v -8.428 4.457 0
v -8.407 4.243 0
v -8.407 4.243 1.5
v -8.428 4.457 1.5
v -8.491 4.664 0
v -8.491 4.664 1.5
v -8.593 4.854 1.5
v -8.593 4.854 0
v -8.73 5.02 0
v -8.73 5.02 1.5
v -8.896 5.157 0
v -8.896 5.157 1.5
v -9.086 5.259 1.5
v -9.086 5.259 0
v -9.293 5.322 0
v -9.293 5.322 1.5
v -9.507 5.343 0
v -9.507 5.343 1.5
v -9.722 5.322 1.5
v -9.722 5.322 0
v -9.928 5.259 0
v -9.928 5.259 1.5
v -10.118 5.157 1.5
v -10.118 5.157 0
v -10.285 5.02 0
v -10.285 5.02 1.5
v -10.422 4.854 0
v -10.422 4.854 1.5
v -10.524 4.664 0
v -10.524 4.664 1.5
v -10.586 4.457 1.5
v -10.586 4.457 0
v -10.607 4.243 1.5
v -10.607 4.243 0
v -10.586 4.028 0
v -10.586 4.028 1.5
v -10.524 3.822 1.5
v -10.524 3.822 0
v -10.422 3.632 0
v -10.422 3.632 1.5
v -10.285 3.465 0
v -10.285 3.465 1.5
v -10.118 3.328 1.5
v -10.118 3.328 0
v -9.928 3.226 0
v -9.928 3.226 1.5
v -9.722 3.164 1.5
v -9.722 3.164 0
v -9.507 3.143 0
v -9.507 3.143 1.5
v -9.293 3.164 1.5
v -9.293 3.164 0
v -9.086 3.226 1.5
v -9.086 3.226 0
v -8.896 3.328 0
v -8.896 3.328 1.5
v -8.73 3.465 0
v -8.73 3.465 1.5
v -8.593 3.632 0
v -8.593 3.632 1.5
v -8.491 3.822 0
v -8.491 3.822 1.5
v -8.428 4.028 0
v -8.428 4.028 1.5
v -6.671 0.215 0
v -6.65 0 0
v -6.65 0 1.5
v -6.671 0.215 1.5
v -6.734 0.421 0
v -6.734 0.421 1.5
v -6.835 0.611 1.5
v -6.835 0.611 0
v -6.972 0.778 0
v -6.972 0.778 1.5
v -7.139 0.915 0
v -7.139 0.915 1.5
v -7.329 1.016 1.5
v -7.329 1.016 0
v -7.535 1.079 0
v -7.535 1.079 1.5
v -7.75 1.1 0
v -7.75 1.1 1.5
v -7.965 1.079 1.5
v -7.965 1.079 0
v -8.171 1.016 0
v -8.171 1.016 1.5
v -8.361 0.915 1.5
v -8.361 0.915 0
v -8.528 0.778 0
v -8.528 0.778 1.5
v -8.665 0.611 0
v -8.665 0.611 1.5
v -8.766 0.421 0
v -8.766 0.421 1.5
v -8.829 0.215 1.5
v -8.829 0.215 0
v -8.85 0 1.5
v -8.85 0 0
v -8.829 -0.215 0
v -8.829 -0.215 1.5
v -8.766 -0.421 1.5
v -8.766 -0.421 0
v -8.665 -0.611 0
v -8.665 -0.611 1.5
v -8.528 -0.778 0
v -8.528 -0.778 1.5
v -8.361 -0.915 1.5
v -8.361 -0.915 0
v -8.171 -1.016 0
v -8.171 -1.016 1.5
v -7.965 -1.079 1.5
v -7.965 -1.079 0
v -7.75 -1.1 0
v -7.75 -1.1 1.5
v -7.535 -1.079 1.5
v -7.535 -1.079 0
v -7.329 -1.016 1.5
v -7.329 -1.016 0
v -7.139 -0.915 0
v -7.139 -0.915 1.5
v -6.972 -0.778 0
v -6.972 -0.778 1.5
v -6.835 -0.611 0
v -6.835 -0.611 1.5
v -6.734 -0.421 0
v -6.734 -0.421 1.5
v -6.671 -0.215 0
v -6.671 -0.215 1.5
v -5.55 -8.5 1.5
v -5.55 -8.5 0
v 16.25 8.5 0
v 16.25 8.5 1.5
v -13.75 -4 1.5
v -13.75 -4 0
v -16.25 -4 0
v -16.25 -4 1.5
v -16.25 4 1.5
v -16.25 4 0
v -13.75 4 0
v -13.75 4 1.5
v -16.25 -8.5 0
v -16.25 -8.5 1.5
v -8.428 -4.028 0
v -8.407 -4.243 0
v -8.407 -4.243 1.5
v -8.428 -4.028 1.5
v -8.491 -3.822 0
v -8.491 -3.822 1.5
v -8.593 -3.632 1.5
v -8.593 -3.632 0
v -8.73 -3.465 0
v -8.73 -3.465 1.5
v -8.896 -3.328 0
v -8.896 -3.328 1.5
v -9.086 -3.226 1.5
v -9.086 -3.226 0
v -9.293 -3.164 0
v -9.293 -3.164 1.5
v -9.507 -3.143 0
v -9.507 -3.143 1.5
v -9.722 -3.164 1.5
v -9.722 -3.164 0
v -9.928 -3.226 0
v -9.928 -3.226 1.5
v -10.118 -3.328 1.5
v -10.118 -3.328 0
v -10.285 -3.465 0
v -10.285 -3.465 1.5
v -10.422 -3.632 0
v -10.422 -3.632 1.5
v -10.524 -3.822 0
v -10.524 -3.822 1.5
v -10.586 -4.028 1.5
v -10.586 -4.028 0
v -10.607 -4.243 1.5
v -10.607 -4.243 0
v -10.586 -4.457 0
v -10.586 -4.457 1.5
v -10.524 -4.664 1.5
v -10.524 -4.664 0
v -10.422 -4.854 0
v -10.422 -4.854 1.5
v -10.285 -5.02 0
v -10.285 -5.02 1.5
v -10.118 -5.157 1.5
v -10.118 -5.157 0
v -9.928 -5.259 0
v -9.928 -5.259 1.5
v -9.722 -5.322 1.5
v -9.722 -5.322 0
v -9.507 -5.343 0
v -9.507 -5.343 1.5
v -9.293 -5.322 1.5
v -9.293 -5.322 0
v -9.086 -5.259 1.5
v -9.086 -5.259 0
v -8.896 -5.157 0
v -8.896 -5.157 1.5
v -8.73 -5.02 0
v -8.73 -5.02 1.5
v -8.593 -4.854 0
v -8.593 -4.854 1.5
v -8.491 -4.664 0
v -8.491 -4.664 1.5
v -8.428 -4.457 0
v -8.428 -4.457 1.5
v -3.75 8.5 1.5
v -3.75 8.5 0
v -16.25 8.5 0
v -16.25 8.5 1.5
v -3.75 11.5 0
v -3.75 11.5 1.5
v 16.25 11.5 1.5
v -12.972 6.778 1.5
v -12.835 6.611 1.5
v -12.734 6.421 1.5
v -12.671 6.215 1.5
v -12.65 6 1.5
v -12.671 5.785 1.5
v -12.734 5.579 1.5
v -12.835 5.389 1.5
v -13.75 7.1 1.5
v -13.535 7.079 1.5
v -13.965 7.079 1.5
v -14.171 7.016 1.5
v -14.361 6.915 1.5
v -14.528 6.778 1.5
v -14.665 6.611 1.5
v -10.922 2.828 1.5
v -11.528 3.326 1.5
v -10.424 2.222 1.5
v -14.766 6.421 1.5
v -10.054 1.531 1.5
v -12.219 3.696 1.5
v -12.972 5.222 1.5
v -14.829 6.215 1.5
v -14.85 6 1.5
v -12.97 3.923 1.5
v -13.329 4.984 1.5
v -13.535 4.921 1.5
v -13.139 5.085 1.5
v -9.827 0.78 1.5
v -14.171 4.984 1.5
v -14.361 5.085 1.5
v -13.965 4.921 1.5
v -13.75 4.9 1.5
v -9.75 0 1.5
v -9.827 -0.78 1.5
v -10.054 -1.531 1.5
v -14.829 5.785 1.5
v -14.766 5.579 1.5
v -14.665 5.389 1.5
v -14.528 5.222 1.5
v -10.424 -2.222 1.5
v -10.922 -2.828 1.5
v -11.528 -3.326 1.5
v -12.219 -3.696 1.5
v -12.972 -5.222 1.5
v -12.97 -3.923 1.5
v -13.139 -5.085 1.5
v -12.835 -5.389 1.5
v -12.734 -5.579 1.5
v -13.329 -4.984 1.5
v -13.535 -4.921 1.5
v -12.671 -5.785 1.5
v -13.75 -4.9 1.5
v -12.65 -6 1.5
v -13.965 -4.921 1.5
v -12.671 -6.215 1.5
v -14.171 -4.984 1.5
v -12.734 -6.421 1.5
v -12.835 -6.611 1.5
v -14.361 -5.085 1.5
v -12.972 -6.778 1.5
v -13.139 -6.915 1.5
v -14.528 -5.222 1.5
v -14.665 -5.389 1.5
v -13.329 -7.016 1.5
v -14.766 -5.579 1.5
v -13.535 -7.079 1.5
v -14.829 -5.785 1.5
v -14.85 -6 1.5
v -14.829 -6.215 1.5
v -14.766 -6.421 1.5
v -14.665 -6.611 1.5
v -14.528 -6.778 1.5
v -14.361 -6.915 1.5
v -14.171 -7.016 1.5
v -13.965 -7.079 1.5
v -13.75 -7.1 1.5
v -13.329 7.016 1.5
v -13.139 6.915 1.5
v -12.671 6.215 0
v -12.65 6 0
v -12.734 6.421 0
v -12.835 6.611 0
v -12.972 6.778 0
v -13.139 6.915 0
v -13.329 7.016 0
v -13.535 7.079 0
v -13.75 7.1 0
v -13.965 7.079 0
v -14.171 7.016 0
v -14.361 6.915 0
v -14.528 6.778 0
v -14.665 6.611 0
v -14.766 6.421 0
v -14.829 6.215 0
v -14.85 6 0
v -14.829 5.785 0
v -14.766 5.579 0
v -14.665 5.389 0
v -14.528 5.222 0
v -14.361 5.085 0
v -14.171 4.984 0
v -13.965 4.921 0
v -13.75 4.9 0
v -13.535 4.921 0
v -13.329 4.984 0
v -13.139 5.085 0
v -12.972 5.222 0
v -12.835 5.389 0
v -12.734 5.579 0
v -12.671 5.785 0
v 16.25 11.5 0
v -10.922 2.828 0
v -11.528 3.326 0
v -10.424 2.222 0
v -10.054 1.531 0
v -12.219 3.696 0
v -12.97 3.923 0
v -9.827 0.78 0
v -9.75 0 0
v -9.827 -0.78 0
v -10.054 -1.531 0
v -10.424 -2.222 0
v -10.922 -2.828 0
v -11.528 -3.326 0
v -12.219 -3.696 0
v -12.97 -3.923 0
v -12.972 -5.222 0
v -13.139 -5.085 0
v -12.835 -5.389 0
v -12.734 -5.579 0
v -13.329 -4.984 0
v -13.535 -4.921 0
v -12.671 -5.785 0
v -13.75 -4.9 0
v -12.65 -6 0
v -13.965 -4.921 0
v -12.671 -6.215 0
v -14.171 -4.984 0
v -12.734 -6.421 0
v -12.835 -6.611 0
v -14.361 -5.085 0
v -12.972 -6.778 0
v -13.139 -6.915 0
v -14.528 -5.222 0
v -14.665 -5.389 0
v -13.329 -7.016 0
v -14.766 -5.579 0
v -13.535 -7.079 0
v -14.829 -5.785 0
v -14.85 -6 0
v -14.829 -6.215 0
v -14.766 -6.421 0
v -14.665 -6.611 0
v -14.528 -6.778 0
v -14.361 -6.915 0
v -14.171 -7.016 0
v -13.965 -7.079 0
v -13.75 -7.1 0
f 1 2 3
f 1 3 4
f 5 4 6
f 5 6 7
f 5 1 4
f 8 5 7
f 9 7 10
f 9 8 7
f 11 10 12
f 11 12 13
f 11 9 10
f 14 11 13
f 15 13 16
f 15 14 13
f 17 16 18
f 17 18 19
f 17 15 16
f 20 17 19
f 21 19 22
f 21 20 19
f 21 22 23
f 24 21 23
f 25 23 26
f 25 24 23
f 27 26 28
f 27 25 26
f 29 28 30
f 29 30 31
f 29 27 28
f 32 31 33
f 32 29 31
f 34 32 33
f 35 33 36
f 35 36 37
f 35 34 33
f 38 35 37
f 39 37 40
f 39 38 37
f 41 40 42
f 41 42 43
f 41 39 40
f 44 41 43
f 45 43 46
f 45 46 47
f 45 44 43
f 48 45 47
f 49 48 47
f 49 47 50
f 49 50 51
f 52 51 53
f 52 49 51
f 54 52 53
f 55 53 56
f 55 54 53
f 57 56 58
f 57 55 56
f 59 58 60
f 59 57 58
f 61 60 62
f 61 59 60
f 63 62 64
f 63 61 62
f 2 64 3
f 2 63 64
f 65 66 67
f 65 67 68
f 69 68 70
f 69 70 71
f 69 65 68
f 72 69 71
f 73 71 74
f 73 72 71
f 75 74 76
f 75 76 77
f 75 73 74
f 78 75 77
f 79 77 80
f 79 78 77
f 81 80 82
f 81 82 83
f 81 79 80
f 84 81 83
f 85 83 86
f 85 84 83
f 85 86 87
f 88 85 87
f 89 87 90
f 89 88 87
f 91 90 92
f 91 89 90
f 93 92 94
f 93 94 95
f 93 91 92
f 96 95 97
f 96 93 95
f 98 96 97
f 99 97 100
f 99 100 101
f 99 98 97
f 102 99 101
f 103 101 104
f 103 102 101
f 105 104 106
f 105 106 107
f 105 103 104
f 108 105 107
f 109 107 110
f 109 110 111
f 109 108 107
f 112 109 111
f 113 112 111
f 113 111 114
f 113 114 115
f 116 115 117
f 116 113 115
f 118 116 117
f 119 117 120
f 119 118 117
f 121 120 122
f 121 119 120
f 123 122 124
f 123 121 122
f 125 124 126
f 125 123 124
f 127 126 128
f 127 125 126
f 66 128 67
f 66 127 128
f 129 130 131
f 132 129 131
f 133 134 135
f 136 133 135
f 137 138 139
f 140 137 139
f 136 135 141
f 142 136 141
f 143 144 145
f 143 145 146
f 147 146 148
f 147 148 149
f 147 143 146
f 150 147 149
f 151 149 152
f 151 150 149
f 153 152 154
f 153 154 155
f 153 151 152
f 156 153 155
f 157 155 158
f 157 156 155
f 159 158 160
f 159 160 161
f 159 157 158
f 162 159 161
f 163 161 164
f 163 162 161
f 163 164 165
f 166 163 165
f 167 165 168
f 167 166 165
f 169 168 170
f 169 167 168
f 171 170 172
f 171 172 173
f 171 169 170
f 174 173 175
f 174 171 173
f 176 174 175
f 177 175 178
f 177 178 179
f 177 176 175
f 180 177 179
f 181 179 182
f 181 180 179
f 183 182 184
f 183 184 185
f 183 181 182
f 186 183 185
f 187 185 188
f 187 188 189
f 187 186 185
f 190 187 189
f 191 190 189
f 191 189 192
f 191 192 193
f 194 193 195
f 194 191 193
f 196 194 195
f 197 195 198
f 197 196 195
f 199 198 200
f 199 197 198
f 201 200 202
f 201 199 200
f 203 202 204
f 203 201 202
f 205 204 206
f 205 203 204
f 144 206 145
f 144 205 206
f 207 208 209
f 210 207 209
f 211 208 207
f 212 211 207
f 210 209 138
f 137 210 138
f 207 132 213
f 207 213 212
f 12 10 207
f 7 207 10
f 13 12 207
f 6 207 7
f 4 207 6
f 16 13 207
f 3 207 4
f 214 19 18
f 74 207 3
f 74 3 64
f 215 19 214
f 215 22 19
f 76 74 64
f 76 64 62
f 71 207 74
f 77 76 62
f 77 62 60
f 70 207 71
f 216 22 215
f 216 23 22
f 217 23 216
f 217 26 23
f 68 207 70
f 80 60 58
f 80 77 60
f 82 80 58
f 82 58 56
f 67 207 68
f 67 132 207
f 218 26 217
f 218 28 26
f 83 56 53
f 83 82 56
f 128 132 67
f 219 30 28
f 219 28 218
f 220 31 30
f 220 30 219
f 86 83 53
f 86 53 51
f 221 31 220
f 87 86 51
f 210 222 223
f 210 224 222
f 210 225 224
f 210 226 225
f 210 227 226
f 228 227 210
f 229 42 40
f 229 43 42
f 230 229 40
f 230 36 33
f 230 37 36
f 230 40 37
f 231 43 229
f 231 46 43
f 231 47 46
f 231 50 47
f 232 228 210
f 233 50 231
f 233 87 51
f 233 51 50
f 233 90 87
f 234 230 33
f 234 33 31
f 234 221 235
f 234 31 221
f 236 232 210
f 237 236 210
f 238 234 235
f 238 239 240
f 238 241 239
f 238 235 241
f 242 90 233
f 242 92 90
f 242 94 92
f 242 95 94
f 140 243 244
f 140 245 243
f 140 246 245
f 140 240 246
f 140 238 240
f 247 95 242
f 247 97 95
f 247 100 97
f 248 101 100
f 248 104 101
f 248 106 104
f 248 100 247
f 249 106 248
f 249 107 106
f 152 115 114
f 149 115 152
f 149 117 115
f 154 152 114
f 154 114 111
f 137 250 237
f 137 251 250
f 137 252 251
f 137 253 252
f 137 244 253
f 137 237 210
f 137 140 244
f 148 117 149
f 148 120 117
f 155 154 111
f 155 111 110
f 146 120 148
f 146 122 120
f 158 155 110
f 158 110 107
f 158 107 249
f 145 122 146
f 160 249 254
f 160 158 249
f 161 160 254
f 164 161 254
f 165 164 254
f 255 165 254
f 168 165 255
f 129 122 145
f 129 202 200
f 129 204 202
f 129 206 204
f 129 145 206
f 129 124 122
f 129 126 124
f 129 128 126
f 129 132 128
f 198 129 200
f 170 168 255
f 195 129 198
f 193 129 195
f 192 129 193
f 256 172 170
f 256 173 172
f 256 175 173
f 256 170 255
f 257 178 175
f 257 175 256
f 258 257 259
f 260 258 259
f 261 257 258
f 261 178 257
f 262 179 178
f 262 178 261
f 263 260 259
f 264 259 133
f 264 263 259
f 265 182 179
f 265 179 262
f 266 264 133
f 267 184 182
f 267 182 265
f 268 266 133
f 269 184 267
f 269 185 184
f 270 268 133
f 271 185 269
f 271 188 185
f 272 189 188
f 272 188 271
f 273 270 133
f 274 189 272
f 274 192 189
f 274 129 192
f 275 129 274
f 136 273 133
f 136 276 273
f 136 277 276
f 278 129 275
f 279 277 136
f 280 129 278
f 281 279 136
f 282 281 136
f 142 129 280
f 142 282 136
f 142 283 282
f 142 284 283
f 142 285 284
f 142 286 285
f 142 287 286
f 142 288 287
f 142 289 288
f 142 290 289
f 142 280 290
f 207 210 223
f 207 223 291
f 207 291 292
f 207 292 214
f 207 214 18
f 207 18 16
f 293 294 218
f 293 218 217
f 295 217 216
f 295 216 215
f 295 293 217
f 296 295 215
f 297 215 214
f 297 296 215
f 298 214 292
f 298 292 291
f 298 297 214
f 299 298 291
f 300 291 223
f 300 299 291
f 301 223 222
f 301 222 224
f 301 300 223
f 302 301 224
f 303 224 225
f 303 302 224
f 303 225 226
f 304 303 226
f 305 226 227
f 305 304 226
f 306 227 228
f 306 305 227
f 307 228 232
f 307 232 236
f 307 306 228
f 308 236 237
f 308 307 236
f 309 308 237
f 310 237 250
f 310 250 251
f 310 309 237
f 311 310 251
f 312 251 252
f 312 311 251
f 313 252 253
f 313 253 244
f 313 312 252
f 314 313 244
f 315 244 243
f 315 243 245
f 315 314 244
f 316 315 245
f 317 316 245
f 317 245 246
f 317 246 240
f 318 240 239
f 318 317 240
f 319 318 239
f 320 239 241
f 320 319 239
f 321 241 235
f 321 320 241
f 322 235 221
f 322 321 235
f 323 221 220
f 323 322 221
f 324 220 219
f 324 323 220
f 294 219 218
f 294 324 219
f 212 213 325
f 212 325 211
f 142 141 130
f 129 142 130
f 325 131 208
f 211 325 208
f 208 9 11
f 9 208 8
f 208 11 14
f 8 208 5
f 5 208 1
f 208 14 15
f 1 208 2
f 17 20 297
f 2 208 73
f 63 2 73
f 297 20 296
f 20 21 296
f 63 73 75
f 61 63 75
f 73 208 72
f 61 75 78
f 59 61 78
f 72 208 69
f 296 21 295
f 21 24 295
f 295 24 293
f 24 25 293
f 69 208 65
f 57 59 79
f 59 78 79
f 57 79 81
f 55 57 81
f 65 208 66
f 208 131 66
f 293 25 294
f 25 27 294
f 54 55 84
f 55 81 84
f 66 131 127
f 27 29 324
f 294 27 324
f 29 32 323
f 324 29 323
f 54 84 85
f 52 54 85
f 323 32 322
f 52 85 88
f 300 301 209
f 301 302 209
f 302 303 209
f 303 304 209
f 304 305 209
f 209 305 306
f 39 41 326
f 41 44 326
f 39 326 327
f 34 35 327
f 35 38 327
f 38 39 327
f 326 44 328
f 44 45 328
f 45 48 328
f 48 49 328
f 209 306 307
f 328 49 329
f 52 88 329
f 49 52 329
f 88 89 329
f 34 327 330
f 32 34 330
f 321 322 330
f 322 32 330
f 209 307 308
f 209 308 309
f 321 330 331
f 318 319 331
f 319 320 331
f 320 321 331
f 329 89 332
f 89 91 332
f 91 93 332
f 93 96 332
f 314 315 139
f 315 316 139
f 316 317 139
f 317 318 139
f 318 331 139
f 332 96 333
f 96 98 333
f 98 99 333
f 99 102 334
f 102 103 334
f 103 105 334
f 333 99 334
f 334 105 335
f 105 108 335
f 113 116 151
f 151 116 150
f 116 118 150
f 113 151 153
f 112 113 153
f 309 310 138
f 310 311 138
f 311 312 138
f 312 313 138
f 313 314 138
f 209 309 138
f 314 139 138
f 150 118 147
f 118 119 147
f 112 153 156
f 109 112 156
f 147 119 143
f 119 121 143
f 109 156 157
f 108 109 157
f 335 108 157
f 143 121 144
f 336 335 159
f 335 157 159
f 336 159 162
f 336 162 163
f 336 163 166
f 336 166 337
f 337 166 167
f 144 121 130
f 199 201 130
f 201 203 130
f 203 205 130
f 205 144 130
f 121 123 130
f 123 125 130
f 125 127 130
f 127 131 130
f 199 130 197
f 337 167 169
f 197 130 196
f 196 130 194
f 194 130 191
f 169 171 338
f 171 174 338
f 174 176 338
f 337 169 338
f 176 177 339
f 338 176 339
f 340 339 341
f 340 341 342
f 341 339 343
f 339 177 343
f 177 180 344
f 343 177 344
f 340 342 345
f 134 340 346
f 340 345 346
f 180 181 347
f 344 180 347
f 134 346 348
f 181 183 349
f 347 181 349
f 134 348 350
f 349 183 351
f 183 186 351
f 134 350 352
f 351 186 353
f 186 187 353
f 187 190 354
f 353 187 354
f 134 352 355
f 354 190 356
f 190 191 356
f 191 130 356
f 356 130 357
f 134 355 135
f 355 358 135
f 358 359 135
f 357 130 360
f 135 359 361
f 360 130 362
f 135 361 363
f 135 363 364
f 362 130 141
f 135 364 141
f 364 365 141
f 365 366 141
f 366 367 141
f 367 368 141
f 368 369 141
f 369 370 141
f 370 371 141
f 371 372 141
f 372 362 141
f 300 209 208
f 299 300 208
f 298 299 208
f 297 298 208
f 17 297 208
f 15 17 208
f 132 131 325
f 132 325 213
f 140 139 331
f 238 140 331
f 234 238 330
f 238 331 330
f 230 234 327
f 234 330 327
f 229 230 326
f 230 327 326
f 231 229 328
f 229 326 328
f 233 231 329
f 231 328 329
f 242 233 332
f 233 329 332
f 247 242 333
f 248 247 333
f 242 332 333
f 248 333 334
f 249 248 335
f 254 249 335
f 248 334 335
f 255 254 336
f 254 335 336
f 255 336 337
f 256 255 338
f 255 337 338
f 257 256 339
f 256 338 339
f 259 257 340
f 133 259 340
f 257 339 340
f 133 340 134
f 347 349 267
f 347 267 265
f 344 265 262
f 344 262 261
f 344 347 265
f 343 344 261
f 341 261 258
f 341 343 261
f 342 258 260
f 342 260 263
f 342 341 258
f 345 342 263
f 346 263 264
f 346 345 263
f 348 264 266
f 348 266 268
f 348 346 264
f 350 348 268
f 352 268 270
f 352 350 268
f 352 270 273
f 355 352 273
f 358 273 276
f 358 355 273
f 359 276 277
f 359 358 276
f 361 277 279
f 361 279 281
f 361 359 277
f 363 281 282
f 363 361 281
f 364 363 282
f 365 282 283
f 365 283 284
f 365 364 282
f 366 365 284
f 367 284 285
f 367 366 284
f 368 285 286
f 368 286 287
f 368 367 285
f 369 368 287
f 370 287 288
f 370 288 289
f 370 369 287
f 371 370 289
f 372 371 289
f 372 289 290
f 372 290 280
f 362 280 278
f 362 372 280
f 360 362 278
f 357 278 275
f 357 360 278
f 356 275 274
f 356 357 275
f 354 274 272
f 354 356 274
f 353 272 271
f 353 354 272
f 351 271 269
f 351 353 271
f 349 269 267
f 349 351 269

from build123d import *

# Parameters (mm, degrees)
F0_R     = 1.1
F1_DEPTH = 1.5
F2_W     = 20
F2_H     = 1.5
F3_DEPTH = 3


with BuildPart() as f1:
    # F0 (on Top) → F1 (new body)
    with BuildSketch(Plane.XY):
        with BuildLine():
            Line((-5.55, -8.5), (16.25, 8.5))
            Line((16.25, 8.5), (-16.25, 8.5))
            Line((-16.25, 8.5), (-16.25, 4))
            Line((-16.25, 4), (-13.75, 4))
            ThreePointArc((-13.75, 4), (-9.75, 0), (-13.75, -4))
            Line((-13.75, -4), (-16.25, -4))
            Line((-16.25, -4), (-16.25, -8.5))
            Line((-16.25, -8.5), (-5.55, -8.5))
        make_face()
        with Locations((-13.75, -6)):
            Circle(F0_R, mode=Mode.SUBTRACT)
        with Locations((-9.507359, -4.242641)):
            Circle(F0_R, mode=Mode.SUBTRACT)
        with Locations((-9.507359, 4.242641)):
            Circle(F0_R, mode=Mode.SUBTRACT)
        with Locations((-7.75, 0)):
            Circle(F0_R, mode=Mode.SUBTRACT)
        with Locations((-13.75, 6)):
            Circle(F0_R, mode=Mode.SUBTRACT)
    extrude(amount=F1_DEPTH)

    # F2 (on face) → F3 (join)
    with BuildSketch(Plane(origin=(0, 8.5, 0), x_dir=(-1, 0, 0), z_dir=(0, 1, 0))):
        with Locations((-6.25, 0.75)):
            Rectangle(F2_W, F2_H)
    extrude(amount=F3_DEPTH)


solid = f1.part
